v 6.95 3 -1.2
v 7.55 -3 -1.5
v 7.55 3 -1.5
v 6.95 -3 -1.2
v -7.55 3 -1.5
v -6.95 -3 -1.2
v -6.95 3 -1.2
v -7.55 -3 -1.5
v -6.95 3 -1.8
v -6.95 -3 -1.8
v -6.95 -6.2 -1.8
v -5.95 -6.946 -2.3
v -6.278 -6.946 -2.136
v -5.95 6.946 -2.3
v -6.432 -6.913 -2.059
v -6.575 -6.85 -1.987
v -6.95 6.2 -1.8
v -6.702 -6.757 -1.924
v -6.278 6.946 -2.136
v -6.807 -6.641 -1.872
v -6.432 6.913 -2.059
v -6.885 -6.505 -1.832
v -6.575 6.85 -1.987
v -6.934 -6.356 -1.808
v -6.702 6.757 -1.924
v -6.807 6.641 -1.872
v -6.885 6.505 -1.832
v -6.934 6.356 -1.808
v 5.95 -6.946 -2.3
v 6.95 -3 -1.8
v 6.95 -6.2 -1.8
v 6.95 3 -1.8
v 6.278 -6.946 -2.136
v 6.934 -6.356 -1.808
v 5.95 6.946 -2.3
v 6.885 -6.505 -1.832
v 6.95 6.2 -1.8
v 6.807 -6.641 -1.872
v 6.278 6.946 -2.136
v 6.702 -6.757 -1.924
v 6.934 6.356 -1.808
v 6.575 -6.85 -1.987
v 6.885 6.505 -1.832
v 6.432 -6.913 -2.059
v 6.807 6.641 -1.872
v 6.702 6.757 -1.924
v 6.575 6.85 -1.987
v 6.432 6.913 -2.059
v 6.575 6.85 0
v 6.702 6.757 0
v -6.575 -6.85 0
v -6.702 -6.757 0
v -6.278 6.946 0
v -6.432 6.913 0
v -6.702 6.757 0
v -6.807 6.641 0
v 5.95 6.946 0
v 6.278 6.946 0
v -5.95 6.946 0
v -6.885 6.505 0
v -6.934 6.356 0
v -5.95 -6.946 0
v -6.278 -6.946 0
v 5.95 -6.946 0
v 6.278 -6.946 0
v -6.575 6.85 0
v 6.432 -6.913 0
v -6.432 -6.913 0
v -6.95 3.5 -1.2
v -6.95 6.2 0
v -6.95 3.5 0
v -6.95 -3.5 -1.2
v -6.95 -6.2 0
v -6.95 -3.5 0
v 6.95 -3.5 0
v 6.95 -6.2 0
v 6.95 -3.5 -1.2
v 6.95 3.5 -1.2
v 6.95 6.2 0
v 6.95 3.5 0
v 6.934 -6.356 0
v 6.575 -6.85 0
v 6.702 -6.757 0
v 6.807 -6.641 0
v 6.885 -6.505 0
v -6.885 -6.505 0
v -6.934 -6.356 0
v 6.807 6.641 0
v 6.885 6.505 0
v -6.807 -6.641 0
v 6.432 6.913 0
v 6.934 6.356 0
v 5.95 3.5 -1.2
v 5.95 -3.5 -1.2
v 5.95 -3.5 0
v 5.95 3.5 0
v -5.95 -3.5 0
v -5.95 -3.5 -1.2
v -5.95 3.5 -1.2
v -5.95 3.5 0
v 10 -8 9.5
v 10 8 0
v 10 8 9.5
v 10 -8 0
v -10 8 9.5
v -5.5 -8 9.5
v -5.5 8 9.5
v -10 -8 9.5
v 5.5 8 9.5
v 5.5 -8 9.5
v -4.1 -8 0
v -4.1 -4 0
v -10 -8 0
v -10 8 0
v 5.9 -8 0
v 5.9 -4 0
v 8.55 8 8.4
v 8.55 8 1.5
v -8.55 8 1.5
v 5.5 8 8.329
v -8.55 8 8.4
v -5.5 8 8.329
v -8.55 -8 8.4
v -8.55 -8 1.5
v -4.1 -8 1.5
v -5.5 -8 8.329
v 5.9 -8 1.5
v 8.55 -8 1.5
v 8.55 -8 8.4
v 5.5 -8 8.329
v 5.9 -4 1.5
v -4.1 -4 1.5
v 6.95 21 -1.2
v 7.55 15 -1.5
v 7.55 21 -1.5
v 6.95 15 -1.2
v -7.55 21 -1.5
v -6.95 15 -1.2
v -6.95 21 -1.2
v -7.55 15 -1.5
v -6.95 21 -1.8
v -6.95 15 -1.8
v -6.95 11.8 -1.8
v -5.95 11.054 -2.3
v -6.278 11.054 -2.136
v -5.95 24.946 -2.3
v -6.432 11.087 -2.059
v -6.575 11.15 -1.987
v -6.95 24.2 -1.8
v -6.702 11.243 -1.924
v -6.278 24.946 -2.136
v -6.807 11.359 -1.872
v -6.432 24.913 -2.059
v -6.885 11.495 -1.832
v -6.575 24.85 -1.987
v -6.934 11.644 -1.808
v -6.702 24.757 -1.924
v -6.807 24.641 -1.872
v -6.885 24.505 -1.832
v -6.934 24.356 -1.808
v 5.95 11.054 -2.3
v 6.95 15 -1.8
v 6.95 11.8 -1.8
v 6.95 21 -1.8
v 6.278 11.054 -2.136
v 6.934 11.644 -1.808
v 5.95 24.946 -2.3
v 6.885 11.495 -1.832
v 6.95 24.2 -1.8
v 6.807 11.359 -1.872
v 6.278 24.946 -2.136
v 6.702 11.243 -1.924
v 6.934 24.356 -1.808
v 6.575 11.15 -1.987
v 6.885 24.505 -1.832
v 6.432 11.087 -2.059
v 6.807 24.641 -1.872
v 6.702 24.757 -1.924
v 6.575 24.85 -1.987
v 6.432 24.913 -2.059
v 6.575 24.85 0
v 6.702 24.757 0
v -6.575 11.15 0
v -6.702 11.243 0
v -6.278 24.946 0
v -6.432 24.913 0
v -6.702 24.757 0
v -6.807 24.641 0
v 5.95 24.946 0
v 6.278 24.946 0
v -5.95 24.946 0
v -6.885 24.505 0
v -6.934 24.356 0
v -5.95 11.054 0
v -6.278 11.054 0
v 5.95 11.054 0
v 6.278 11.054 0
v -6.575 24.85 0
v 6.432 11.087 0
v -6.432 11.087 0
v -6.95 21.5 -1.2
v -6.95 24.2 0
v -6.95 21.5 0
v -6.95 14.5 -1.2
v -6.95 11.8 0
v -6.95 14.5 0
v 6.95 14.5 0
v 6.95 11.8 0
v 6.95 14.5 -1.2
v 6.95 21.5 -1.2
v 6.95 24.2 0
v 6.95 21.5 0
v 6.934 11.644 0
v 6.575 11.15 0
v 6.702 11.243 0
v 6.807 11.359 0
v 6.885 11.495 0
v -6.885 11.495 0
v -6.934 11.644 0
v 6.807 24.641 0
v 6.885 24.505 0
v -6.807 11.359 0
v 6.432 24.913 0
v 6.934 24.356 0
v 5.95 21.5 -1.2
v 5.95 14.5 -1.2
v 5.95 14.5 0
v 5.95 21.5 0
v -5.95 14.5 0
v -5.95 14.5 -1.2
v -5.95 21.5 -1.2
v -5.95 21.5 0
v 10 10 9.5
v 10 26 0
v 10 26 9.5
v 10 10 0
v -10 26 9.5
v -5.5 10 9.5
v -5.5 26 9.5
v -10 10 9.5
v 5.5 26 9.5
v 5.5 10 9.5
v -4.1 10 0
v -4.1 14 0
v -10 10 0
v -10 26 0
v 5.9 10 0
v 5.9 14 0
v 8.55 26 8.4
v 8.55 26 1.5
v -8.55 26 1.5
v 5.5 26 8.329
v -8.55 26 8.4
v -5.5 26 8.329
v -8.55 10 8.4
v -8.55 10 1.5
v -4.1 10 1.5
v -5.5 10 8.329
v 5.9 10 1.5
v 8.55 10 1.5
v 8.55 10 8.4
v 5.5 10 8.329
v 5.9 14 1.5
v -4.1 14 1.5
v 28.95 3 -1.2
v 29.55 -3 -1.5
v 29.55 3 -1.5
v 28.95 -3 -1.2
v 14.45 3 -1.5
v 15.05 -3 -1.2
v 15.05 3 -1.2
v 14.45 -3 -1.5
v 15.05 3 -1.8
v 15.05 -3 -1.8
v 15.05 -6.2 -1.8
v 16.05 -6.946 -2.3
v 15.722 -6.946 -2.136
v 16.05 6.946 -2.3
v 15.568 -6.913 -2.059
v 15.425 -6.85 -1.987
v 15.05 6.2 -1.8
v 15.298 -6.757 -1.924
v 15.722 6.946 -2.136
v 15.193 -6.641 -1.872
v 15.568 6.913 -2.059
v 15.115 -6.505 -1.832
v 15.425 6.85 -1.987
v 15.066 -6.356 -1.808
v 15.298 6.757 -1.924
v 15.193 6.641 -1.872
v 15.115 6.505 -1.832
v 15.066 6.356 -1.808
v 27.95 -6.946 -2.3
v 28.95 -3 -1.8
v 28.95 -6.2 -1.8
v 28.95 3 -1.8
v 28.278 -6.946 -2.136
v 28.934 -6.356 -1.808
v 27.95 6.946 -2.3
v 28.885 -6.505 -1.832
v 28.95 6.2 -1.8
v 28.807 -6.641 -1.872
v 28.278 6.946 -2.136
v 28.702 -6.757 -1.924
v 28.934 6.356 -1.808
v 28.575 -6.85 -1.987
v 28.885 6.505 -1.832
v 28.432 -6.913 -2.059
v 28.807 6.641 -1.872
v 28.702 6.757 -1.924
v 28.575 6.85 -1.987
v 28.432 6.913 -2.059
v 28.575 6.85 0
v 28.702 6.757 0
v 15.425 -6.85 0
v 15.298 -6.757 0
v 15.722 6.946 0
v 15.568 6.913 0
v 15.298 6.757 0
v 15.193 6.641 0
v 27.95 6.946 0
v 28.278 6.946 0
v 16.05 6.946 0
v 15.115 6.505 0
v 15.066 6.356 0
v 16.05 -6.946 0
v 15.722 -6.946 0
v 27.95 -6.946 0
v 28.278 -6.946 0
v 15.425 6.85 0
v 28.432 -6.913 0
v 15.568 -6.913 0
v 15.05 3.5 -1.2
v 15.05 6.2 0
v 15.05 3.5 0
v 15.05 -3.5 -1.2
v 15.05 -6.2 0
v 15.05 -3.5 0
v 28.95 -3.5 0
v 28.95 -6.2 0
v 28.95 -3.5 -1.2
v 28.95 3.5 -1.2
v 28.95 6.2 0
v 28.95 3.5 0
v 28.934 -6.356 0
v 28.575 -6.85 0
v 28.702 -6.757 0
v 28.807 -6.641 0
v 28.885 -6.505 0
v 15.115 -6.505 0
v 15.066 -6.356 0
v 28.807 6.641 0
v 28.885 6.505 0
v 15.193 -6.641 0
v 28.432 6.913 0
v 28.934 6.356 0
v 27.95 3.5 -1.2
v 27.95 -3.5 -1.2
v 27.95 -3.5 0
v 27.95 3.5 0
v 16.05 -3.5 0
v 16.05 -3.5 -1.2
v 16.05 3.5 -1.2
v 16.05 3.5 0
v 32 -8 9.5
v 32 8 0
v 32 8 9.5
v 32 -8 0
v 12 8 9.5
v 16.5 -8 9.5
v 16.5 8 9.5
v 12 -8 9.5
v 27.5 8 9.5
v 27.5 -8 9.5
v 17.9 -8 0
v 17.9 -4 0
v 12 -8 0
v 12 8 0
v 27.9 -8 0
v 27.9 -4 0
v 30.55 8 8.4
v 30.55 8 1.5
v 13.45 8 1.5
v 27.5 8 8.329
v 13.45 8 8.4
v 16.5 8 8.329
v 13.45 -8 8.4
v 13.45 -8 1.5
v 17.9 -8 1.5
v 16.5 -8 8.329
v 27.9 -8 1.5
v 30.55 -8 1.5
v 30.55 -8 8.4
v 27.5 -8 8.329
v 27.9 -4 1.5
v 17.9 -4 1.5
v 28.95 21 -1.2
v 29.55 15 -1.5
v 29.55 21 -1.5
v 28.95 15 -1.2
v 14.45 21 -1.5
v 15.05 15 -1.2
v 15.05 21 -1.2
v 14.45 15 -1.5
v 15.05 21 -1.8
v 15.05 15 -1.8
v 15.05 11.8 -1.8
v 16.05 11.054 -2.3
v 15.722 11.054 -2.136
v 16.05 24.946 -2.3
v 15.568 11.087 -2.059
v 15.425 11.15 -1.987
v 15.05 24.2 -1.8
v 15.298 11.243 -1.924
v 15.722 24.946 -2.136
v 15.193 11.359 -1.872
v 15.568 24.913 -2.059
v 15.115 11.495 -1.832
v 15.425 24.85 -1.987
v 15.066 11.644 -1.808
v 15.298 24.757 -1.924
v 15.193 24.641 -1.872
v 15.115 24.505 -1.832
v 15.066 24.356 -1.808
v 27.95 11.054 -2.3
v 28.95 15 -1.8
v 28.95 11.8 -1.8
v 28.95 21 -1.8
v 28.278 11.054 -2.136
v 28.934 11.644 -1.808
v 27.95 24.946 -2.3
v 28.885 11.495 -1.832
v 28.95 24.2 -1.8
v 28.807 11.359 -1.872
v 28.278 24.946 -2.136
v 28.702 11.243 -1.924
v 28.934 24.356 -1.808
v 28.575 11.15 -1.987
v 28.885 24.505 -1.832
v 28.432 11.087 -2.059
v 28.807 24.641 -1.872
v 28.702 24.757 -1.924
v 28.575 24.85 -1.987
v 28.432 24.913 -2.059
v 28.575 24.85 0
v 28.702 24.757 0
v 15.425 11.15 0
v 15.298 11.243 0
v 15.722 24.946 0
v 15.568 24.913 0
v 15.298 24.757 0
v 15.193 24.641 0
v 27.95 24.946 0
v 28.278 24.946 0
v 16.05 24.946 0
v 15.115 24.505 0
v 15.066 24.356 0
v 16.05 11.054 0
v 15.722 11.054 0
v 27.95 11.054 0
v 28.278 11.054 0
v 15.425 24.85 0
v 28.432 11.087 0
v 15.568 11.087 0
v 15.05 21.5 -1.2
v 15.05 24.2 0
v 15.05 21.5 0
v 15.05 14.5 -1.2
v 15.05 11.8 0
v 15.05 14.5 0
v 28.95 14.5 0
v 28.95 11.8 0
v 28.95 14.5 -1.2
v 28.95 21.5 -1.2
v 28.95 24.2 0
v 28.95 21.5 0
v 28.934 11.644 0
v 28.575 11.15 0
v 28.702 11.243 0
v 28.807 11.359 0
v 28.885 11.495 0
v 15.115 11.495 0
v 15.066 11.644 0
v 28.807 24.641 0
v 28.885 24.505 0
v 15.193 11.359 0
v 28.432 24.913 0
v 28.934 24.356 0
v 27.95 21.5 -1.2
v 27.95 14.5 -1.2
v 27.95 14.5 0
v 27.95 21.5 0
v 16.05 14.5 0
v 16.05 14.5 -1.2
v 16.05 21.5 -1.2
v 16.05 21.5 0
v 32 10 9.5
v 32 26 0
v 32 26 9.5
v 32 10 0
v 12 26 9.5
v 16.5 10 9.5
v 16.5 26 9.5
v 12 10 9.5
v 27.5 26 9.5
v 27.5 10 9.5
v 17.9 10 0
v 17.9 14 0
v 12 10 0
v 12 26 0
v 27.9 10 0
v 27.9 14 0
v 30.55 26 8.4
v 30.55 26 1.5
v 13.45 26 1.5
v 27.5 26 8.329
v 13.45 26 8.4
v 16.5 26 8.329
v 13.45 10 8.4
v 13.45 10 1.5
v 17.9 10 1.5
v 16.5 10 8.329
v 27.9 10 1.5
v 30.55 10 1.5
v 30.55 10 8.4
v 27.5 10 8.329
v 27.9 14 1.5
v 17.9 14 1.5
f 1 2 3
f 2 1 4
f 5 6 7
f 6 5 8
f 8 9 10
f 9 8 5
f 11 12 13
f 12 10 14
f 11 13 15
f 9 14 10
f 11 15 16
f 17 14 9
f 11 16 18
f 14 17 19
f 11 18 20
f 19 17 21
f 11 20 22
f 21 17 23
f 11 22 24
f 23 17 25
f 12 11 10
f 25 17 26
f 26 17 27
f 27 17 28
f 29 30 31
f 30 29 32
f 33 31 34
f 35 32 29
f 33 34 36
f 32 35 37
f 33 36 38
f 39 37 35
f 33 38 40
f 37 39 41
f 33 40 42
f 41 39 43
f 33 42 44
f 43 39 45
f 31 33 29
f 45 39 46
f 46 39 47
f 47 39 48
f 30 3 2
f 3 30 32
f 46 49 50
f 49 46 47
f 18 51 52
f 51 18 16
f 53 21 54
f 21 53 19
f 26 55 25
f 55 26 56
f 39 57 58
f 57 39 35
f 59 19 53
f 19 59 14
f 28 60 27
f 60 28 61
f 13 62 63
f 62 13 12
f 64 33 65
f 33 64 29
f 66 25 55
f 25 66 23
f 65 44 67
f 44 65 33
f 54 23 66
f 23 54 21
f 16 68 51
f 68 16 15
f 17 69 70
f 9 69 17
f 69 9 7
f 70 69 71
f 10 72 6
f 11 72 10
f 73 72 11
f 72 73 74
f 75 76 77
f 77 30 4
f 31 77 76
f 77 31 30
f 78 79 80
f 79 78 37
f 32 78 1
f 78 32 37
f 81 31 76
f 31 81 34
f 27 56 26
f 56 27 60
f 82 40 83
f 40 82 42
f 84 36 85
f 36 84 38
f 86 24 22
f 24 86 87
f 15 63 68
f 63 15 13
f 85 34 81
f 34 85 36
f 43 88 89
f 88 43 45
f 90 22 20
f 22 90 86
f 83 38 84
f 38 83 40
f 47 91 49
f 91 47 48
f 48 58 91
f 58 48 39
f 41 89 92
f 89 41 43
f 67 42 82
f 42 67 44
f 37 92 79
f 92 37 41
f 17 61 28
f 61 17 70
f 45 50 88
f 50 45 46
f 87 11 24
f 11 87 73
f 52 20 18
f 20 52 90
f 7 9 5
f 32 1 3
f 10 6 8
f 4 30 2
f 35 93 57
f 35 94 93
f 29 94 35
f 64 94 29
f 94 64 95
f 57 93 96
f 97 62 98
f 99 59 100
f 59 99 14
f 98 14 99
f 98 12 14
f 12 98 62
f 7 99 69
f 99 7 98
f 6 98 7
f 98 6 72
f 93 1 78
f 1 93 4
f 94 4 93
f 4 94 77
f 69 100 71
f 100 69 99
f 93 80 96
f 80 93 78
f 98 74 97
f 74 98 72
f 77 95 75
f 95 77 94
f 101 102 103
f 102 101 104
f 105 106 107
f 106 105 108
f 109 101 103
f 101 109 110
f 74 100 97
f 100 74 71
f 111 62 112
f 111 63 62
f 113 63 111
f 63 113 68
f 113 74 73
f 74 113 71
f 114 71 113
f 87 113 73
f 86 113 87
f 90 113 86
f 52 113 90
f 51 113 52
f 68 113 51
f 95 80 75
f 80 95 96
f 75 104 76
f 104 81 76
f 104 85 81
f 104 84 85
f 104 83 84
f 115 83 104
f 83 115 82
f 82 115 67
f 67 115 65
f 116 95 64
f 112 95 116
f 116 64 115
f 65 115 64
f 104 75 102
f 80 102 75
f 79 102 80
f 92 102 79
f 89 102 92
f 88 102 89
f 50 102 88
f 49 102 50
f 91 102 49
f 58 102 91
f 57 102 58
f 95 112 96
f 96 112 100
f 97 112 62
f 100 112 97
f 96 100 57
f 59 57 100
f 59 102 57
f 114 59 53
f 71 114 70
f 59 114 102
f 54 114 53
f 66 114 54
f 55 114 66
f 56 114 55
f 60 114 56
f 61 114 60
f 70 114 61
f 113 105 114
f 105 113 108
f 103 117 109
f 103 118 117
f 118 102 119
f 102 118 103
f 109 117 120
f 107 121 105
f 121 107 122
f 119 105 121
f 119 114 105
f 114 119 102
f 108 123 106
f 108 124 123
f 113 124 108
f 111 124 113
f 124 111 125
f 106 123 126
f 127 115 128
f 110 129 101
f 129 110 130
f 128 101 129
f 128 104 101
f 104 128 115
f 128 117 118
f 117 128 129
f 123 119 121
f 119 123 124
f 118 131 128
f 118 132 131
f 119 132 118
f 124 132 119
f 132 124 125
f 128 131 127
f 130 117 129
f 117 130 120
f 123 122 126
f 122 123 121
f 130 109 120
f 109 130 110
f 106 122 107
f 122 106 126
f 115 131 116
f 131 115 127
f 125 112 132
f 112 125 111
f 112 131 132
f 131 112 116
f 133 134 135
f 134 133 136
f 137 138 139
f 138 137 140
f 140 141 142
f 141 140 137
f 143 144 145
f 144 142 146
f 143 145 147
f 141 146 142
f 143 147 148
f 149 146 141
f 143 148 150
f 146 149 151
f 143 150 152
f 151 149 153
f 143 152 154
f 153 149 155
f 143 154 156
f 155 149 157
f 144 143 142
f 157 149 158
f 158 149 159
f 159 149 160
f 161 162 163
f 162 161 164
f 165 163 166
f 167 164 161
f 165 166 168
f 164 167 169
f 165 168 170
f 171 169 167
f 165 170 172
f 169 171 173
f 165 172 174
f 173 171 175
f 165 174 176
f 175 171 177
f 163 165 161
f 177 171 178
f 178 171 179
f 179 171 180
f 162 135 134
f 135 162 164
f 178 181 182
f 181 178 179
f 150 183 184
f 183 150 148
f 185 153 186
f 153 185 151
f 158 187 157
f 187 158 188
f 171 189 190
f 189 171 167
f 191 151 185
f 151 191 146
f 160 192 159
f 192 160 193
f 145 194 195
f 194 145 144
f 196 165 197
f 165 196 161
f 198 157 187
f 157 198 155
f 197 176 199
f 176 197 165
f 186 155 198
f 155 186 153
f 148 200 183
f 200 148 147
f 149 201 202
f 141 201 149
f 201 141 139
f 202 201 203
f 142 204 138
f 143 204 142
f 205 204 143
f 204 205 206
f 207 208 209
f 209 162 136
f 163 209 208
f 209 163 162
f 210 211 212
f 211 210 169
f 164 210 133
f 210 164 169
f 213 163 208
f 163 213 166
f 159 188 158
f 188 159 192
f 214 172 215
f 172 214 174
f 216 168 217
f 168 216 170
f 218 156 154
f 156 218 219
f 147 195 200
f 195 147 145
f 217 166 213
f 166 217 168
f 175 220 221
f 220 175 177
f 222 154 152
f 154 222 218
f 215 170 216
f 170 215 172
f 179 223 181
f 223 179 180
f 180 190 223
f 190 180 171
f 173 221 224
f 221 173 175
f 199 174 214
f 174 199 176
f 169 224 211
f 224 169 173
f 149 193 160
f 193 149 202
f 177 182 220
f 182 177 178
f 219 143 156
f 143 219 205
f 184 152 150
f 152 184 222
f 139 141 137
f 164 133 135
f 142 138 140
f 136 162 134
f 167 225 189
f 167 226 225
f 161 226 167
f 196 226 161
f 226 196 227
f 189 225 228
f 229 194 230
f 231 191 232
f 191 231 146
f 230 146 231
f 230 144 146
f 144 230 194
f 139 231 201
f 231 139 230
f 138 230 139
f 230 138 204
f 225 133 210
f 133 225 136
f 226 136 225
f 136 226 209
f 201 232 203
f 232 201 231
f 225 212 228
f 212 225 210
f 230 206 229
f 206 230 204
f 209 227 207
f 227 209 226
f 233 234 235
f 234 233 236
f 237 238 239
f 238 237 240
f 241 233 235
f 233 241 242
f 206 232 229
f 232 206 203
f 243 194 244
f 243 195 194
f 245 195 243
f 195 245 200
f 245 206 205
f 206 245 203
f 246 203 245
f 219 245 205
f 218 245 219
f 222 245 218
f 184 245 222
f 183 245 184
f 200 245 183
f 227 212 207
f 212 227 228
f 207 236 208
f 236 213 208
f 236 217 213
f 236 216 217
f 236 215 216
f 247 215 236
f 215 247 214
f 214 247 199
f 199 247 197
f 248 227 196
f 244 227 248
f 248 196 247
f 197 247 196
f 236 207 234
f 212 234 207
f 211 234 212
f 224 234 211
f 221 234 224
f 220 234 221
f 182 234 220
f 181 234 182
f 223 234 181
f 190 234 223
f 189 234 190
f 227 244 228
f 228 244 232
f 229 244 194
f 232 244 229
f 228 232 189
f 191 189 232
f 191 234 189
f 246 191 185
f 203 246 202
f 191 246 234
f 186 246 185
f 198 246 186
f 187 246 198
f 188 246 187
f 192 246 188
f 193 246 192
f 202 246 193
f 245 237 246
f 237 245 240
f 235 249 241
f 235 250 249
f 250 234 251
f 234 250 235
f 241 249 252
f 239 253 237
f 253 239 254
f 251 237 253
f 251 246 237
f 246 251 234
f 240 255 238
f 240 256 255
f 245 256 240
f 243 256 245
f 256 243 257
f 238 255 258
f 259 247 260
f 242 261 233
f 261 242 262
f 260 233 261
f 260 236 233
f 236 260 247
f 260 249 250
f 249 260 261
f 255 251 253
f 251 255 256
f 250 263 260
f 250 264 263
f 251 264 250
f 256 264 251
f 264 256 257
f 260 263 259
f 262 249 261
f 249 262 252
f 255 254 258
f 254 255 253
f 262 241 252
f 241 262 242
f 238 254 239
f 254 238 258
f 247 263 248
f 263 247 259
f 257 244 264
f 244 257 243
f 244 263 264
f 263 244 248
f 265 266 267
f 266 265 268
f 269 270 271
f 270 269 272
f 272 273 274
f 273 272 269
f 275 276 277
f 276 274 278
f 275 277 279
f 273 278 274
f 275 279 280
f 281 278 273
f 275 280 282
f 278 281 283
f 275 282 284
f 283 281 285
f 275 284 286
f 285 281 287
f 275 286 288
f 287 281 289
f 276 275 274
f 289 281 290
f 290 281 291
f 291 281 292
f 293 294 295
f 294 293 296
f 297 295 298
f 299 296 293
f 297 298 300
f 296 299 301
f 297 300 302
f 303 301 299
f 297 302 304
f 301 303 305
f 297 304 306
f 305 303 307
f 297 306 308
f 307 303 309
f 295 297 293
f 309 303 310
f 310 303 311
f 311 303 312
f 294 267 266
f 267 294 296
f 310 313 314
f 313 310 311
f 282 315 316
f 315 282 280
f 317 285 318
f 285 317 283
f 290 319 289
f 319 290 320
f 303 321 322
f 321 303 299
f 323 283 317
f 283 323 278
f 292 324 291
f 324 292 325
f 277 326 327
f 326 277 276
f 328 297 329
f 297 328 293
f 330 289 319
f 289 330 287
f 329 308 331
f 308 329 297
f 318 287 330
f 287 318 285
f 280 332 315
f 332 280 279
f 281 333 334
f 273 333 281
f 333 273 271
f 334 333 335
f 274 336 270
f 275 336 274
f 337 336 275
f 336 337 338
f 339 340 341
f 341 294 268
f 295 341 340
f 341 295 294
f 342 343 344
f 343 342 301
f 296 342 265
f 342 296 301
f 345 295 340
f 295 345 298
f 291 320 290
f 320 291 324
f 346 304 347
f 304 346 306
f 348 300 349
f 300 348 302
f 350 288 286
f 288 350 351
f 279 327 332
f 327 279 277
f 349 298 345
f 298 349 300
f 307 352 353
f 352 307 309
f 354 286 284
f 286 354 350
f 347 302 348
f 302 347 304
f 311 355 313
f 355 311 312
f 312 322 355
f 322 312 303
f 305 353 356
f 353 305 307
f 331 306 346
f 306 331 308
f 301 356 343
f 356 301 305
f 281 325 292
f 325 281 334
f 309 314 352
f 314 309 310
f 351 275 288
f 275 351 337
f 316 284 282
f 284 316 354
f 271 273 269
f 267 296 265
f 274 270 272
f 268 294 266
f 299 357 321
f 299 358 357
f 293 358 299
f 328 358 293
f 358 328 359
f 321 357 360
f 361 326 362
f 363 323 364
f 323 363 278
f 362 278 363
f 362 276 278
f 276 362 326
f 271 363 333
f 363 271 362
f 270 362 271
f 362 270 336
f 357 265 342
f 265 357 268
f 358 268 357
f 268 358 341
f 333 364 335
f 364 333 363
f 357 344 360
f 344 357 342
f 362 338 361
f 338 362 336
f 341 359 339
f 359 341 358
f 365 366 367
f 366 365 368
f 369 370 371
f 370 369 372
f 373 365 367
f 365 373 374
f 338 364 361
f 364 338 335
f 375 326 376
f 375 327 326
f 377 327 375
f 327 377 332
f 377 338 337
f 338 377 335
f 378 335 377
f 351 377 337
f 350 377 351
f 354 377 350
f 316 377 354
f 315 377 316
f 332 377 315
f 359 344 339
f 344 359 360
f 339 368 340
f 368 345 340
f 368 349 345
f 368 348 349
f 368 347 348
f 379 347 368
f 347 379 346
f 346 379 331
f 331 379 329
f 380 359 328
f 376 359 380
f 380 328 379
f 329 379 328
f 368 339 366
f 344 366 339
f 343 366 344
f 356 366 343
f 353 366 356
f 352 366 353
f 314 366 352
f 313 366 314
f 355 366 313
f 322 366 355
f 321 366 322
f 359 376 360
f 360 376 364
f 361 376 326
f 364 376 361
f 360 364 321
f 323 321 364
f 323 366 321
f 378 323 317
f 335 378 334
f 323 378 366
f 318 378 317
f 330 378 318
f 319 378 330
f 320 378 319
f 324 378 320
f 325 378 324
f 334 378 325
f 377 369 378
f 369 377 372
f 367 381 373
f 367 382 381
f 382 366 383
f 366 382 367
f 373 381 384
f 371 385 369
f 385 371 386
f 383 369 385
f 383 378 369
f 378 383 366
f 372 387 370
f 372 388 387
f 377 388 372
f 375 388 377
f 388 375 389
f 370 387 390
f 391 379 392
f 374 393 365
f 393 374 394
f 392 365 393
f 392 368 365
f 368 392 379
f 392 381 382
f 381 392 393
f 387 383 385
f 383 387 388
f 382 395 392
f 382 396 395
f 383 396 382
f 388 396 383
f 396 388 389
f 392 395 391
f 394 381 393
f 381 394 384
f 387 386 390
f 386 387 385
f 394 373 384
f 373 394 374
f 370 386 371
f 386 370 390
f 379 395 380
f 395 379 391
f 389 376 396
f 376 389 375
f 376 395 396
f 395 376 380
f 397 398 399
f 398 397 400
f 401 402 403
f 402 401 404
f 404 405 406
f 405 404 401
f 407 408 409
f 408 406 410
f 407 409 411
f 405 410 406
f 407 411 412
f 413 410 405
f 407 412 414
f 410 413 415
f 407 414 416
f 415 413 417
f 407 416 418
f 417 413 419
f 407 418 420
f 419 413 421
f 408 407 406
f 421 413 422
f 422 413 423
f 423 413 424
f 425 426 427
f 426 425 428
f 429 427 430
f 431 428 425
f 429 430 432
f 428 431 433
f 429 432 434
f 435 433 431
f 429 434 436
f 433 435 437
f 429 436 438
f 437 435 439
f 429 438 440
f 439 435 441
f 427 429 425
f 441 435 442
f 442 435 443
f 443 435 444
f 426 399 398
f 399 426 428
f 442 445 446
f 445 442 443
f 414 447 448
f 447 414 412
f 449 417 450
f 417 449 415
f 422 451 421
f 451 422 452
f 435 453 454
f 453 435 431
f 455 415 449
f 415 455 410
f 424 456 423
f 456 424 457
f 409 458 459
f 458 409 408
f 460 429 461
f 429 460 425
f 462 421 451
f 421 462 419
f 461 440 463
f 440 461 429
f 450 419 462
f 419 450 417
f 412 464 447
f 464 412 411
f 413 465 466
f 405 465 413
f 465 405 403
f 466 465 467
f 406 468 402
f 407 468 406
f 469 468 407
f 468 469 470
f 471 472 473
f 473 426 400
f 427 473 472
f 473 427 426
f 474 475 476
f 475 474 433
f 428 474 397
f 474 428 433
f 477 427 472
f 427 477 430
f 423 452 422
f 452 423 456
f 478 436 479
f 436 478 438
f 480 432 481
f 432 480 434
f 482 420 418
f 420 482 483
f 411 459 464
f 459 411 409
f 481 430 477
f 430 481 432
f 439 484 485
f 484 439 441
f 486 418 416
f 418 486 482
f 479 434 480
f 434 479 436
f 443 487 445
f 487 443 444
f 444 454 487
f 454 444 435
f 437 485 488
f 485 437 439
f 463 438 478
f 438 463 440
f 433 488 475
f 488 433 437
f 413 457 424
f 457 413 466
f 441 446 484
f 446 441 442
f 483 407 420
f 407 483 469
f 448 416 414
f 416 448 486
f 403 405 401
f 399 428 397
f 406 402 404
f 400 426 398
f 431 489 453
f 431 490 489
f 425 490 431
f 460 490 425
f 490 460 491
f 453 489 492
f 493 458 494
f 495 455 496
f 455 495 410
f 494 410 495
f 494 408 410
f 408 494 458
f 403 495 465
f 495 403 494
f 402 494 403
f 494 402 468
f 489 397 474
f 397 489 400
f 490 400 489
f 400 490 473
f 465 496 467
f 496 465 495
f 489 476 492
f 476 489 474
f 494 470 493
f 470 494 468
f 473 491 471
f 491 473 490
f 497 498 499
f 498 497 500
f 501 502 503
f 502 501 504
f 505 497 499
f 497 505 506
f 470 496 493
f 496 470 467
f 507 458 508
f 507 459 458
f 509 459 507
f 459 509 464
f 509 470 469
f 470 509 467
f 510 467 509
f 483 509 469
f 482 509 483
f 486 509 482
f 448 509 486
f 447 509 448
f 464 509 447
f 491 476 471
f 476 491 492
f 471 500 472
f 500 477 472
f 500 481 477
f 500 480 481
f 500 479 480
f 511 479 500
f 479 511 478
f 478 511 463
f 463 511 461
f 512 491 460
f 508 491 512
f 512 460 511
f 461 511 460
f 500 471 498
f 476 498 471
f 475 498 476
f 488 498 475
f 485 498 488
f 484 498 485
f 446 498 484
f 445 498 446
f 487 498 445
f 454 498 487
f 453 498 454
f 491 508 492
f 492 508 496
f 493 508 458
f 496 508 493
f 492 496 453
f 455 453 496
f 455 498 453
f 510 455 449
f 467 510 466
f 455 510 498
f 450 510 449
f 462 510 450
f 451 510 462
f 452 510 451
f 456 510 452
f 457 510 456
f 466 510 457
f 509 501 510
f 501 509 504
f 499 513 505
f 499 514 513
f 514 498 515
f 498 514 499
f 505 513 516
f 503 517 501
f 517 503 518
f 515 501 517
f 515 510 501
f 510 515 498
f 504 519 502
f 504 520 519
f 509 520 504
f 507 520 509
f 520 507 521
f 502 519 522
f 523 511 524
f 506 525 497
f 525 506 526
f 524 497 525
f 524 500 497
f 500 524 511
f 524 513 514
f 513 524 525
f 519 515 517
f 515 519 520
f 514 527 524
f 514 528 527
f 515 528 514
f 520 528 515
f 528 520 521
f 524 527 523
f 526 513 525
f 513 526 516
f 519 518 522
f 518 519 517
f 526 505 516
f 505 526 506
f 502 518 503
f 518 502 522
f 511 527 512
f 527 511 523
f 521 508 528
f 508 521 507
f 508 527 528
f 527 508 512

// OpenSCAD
$fs = 0.01;

// キーキャップ穴の大きさ
hole_side_len = 13.9;

// キーキャップ穴の大きさ / 2
hsl = hole_side_len / 2;

// ツメの高さ
hook_height = 0.6;

// キーキャップ穴の大きさ / 2 + ツメの高さ
hsl_hh = hsl + hook_height;

// pcbの厚さ
pcb_thick = 1.2;

// ツメとホルダーの間の厚さ
holding_hook_thick = 1;

// ツメの三角形部分
module diamond(){
    translate([0, 0, -hook_height/2])
        polyhedron(
            points = [
                [hsl_hh, hsl, 0], [hsl_hh, -hsl, 0], [-hsl_hh, -hsl, 0], [-hsl_hh, hsl, 0],
                [0, hsl, -hsl_hh/2], [0, -hsl, -hsl_hh/2], [0, hsl, hsl_hh/2], [0, -hsl, hsl_hh/2] ],
            faces = [
                [0, 3, 4], [1, 5, 2], [0, 4, 5, 1], [2, 5, 4, 3],
                [0, 6, 3], [1, 2, 7], [0, 1, 7, 6], [2, 3, 6, 7]
                ]);
}

module rounded_cube(height) {
    h = 0.01;
    minkowski () {
        cube([hole_side_len - 1.5, hole_side_len - 1.5, height + h], center = true);
        cylinder(r = 0.75, h = h);
    }
}

// キースイッチ用の角穴に引っ掛けるツメ部分
// pcb厚1.2㎜を想定
module holding_hook() {
    translate([0, 0, -pcb_thick])
        difference() {
            union() {
                translate([0, 0, (pcb_thick+0.5)/2]) rounded_cube(pcb_thick + 0.5);
                union(){
                    intersection() {
                        diamond();
                        rounded_cube(18);
                    }
                    intersection() {
                        diamond();
                        translate([-9,-3,-13]) cube([18, 6, 18]);
                    }
                }
            }
            translate([-(hole_side_len - holding_hook_thick * 2)/2, -8, -20])
                cube([hole_side_len - holding_hook_thick * 2, 16, 25]);
            translate([-hsl-0.5, -3.5, 0])
                cube([hole_side_len + 1, 7, 2]);
        }
}

// トラックボール保持部
module holder() {
    x = 17.1 / 2;
    y = 9.0;
    z = 6.9;
    polyhedron(
        points = [
            [x, y, 0], [x, -y, 0], [-x, -y, 0], [-x, y, 0],
            [x, y, z], [x, -y, z], [0, -y, z - 0.2], [-x, -y, z], [-x, y, z], [0, y, z - 0.2]
        ],
        faces = [
            [0, 1, 5, 4], [1, 2, 7, 6, 5], [2, 3, 8, 7], [3, 0, 4, 9, 8],
            [0, 3, 2, 1], [4, 5, 6, 9], [6, 7, 8, 9]
        ]);
}

// ホルダー本体
module trackball_unit_holder() {
    holding_hook();
    difference(){
        translate([-10, -8, 0])
            cube([20, 16, 9.5]);
        translate([0, 0, 1.5])
            holder();
        translate([-5.5, -9, 2])
            cube([11, 18, 15]);
        translate([-4.1, -9, -2])
            cube([10, 5, 4]);
    }
}

for (x = [0: 1]) {
    for (y = [0: 1]) {
        translate([x * 22, y * 18, 0])
            trackball_unit_holder();
    }
}
